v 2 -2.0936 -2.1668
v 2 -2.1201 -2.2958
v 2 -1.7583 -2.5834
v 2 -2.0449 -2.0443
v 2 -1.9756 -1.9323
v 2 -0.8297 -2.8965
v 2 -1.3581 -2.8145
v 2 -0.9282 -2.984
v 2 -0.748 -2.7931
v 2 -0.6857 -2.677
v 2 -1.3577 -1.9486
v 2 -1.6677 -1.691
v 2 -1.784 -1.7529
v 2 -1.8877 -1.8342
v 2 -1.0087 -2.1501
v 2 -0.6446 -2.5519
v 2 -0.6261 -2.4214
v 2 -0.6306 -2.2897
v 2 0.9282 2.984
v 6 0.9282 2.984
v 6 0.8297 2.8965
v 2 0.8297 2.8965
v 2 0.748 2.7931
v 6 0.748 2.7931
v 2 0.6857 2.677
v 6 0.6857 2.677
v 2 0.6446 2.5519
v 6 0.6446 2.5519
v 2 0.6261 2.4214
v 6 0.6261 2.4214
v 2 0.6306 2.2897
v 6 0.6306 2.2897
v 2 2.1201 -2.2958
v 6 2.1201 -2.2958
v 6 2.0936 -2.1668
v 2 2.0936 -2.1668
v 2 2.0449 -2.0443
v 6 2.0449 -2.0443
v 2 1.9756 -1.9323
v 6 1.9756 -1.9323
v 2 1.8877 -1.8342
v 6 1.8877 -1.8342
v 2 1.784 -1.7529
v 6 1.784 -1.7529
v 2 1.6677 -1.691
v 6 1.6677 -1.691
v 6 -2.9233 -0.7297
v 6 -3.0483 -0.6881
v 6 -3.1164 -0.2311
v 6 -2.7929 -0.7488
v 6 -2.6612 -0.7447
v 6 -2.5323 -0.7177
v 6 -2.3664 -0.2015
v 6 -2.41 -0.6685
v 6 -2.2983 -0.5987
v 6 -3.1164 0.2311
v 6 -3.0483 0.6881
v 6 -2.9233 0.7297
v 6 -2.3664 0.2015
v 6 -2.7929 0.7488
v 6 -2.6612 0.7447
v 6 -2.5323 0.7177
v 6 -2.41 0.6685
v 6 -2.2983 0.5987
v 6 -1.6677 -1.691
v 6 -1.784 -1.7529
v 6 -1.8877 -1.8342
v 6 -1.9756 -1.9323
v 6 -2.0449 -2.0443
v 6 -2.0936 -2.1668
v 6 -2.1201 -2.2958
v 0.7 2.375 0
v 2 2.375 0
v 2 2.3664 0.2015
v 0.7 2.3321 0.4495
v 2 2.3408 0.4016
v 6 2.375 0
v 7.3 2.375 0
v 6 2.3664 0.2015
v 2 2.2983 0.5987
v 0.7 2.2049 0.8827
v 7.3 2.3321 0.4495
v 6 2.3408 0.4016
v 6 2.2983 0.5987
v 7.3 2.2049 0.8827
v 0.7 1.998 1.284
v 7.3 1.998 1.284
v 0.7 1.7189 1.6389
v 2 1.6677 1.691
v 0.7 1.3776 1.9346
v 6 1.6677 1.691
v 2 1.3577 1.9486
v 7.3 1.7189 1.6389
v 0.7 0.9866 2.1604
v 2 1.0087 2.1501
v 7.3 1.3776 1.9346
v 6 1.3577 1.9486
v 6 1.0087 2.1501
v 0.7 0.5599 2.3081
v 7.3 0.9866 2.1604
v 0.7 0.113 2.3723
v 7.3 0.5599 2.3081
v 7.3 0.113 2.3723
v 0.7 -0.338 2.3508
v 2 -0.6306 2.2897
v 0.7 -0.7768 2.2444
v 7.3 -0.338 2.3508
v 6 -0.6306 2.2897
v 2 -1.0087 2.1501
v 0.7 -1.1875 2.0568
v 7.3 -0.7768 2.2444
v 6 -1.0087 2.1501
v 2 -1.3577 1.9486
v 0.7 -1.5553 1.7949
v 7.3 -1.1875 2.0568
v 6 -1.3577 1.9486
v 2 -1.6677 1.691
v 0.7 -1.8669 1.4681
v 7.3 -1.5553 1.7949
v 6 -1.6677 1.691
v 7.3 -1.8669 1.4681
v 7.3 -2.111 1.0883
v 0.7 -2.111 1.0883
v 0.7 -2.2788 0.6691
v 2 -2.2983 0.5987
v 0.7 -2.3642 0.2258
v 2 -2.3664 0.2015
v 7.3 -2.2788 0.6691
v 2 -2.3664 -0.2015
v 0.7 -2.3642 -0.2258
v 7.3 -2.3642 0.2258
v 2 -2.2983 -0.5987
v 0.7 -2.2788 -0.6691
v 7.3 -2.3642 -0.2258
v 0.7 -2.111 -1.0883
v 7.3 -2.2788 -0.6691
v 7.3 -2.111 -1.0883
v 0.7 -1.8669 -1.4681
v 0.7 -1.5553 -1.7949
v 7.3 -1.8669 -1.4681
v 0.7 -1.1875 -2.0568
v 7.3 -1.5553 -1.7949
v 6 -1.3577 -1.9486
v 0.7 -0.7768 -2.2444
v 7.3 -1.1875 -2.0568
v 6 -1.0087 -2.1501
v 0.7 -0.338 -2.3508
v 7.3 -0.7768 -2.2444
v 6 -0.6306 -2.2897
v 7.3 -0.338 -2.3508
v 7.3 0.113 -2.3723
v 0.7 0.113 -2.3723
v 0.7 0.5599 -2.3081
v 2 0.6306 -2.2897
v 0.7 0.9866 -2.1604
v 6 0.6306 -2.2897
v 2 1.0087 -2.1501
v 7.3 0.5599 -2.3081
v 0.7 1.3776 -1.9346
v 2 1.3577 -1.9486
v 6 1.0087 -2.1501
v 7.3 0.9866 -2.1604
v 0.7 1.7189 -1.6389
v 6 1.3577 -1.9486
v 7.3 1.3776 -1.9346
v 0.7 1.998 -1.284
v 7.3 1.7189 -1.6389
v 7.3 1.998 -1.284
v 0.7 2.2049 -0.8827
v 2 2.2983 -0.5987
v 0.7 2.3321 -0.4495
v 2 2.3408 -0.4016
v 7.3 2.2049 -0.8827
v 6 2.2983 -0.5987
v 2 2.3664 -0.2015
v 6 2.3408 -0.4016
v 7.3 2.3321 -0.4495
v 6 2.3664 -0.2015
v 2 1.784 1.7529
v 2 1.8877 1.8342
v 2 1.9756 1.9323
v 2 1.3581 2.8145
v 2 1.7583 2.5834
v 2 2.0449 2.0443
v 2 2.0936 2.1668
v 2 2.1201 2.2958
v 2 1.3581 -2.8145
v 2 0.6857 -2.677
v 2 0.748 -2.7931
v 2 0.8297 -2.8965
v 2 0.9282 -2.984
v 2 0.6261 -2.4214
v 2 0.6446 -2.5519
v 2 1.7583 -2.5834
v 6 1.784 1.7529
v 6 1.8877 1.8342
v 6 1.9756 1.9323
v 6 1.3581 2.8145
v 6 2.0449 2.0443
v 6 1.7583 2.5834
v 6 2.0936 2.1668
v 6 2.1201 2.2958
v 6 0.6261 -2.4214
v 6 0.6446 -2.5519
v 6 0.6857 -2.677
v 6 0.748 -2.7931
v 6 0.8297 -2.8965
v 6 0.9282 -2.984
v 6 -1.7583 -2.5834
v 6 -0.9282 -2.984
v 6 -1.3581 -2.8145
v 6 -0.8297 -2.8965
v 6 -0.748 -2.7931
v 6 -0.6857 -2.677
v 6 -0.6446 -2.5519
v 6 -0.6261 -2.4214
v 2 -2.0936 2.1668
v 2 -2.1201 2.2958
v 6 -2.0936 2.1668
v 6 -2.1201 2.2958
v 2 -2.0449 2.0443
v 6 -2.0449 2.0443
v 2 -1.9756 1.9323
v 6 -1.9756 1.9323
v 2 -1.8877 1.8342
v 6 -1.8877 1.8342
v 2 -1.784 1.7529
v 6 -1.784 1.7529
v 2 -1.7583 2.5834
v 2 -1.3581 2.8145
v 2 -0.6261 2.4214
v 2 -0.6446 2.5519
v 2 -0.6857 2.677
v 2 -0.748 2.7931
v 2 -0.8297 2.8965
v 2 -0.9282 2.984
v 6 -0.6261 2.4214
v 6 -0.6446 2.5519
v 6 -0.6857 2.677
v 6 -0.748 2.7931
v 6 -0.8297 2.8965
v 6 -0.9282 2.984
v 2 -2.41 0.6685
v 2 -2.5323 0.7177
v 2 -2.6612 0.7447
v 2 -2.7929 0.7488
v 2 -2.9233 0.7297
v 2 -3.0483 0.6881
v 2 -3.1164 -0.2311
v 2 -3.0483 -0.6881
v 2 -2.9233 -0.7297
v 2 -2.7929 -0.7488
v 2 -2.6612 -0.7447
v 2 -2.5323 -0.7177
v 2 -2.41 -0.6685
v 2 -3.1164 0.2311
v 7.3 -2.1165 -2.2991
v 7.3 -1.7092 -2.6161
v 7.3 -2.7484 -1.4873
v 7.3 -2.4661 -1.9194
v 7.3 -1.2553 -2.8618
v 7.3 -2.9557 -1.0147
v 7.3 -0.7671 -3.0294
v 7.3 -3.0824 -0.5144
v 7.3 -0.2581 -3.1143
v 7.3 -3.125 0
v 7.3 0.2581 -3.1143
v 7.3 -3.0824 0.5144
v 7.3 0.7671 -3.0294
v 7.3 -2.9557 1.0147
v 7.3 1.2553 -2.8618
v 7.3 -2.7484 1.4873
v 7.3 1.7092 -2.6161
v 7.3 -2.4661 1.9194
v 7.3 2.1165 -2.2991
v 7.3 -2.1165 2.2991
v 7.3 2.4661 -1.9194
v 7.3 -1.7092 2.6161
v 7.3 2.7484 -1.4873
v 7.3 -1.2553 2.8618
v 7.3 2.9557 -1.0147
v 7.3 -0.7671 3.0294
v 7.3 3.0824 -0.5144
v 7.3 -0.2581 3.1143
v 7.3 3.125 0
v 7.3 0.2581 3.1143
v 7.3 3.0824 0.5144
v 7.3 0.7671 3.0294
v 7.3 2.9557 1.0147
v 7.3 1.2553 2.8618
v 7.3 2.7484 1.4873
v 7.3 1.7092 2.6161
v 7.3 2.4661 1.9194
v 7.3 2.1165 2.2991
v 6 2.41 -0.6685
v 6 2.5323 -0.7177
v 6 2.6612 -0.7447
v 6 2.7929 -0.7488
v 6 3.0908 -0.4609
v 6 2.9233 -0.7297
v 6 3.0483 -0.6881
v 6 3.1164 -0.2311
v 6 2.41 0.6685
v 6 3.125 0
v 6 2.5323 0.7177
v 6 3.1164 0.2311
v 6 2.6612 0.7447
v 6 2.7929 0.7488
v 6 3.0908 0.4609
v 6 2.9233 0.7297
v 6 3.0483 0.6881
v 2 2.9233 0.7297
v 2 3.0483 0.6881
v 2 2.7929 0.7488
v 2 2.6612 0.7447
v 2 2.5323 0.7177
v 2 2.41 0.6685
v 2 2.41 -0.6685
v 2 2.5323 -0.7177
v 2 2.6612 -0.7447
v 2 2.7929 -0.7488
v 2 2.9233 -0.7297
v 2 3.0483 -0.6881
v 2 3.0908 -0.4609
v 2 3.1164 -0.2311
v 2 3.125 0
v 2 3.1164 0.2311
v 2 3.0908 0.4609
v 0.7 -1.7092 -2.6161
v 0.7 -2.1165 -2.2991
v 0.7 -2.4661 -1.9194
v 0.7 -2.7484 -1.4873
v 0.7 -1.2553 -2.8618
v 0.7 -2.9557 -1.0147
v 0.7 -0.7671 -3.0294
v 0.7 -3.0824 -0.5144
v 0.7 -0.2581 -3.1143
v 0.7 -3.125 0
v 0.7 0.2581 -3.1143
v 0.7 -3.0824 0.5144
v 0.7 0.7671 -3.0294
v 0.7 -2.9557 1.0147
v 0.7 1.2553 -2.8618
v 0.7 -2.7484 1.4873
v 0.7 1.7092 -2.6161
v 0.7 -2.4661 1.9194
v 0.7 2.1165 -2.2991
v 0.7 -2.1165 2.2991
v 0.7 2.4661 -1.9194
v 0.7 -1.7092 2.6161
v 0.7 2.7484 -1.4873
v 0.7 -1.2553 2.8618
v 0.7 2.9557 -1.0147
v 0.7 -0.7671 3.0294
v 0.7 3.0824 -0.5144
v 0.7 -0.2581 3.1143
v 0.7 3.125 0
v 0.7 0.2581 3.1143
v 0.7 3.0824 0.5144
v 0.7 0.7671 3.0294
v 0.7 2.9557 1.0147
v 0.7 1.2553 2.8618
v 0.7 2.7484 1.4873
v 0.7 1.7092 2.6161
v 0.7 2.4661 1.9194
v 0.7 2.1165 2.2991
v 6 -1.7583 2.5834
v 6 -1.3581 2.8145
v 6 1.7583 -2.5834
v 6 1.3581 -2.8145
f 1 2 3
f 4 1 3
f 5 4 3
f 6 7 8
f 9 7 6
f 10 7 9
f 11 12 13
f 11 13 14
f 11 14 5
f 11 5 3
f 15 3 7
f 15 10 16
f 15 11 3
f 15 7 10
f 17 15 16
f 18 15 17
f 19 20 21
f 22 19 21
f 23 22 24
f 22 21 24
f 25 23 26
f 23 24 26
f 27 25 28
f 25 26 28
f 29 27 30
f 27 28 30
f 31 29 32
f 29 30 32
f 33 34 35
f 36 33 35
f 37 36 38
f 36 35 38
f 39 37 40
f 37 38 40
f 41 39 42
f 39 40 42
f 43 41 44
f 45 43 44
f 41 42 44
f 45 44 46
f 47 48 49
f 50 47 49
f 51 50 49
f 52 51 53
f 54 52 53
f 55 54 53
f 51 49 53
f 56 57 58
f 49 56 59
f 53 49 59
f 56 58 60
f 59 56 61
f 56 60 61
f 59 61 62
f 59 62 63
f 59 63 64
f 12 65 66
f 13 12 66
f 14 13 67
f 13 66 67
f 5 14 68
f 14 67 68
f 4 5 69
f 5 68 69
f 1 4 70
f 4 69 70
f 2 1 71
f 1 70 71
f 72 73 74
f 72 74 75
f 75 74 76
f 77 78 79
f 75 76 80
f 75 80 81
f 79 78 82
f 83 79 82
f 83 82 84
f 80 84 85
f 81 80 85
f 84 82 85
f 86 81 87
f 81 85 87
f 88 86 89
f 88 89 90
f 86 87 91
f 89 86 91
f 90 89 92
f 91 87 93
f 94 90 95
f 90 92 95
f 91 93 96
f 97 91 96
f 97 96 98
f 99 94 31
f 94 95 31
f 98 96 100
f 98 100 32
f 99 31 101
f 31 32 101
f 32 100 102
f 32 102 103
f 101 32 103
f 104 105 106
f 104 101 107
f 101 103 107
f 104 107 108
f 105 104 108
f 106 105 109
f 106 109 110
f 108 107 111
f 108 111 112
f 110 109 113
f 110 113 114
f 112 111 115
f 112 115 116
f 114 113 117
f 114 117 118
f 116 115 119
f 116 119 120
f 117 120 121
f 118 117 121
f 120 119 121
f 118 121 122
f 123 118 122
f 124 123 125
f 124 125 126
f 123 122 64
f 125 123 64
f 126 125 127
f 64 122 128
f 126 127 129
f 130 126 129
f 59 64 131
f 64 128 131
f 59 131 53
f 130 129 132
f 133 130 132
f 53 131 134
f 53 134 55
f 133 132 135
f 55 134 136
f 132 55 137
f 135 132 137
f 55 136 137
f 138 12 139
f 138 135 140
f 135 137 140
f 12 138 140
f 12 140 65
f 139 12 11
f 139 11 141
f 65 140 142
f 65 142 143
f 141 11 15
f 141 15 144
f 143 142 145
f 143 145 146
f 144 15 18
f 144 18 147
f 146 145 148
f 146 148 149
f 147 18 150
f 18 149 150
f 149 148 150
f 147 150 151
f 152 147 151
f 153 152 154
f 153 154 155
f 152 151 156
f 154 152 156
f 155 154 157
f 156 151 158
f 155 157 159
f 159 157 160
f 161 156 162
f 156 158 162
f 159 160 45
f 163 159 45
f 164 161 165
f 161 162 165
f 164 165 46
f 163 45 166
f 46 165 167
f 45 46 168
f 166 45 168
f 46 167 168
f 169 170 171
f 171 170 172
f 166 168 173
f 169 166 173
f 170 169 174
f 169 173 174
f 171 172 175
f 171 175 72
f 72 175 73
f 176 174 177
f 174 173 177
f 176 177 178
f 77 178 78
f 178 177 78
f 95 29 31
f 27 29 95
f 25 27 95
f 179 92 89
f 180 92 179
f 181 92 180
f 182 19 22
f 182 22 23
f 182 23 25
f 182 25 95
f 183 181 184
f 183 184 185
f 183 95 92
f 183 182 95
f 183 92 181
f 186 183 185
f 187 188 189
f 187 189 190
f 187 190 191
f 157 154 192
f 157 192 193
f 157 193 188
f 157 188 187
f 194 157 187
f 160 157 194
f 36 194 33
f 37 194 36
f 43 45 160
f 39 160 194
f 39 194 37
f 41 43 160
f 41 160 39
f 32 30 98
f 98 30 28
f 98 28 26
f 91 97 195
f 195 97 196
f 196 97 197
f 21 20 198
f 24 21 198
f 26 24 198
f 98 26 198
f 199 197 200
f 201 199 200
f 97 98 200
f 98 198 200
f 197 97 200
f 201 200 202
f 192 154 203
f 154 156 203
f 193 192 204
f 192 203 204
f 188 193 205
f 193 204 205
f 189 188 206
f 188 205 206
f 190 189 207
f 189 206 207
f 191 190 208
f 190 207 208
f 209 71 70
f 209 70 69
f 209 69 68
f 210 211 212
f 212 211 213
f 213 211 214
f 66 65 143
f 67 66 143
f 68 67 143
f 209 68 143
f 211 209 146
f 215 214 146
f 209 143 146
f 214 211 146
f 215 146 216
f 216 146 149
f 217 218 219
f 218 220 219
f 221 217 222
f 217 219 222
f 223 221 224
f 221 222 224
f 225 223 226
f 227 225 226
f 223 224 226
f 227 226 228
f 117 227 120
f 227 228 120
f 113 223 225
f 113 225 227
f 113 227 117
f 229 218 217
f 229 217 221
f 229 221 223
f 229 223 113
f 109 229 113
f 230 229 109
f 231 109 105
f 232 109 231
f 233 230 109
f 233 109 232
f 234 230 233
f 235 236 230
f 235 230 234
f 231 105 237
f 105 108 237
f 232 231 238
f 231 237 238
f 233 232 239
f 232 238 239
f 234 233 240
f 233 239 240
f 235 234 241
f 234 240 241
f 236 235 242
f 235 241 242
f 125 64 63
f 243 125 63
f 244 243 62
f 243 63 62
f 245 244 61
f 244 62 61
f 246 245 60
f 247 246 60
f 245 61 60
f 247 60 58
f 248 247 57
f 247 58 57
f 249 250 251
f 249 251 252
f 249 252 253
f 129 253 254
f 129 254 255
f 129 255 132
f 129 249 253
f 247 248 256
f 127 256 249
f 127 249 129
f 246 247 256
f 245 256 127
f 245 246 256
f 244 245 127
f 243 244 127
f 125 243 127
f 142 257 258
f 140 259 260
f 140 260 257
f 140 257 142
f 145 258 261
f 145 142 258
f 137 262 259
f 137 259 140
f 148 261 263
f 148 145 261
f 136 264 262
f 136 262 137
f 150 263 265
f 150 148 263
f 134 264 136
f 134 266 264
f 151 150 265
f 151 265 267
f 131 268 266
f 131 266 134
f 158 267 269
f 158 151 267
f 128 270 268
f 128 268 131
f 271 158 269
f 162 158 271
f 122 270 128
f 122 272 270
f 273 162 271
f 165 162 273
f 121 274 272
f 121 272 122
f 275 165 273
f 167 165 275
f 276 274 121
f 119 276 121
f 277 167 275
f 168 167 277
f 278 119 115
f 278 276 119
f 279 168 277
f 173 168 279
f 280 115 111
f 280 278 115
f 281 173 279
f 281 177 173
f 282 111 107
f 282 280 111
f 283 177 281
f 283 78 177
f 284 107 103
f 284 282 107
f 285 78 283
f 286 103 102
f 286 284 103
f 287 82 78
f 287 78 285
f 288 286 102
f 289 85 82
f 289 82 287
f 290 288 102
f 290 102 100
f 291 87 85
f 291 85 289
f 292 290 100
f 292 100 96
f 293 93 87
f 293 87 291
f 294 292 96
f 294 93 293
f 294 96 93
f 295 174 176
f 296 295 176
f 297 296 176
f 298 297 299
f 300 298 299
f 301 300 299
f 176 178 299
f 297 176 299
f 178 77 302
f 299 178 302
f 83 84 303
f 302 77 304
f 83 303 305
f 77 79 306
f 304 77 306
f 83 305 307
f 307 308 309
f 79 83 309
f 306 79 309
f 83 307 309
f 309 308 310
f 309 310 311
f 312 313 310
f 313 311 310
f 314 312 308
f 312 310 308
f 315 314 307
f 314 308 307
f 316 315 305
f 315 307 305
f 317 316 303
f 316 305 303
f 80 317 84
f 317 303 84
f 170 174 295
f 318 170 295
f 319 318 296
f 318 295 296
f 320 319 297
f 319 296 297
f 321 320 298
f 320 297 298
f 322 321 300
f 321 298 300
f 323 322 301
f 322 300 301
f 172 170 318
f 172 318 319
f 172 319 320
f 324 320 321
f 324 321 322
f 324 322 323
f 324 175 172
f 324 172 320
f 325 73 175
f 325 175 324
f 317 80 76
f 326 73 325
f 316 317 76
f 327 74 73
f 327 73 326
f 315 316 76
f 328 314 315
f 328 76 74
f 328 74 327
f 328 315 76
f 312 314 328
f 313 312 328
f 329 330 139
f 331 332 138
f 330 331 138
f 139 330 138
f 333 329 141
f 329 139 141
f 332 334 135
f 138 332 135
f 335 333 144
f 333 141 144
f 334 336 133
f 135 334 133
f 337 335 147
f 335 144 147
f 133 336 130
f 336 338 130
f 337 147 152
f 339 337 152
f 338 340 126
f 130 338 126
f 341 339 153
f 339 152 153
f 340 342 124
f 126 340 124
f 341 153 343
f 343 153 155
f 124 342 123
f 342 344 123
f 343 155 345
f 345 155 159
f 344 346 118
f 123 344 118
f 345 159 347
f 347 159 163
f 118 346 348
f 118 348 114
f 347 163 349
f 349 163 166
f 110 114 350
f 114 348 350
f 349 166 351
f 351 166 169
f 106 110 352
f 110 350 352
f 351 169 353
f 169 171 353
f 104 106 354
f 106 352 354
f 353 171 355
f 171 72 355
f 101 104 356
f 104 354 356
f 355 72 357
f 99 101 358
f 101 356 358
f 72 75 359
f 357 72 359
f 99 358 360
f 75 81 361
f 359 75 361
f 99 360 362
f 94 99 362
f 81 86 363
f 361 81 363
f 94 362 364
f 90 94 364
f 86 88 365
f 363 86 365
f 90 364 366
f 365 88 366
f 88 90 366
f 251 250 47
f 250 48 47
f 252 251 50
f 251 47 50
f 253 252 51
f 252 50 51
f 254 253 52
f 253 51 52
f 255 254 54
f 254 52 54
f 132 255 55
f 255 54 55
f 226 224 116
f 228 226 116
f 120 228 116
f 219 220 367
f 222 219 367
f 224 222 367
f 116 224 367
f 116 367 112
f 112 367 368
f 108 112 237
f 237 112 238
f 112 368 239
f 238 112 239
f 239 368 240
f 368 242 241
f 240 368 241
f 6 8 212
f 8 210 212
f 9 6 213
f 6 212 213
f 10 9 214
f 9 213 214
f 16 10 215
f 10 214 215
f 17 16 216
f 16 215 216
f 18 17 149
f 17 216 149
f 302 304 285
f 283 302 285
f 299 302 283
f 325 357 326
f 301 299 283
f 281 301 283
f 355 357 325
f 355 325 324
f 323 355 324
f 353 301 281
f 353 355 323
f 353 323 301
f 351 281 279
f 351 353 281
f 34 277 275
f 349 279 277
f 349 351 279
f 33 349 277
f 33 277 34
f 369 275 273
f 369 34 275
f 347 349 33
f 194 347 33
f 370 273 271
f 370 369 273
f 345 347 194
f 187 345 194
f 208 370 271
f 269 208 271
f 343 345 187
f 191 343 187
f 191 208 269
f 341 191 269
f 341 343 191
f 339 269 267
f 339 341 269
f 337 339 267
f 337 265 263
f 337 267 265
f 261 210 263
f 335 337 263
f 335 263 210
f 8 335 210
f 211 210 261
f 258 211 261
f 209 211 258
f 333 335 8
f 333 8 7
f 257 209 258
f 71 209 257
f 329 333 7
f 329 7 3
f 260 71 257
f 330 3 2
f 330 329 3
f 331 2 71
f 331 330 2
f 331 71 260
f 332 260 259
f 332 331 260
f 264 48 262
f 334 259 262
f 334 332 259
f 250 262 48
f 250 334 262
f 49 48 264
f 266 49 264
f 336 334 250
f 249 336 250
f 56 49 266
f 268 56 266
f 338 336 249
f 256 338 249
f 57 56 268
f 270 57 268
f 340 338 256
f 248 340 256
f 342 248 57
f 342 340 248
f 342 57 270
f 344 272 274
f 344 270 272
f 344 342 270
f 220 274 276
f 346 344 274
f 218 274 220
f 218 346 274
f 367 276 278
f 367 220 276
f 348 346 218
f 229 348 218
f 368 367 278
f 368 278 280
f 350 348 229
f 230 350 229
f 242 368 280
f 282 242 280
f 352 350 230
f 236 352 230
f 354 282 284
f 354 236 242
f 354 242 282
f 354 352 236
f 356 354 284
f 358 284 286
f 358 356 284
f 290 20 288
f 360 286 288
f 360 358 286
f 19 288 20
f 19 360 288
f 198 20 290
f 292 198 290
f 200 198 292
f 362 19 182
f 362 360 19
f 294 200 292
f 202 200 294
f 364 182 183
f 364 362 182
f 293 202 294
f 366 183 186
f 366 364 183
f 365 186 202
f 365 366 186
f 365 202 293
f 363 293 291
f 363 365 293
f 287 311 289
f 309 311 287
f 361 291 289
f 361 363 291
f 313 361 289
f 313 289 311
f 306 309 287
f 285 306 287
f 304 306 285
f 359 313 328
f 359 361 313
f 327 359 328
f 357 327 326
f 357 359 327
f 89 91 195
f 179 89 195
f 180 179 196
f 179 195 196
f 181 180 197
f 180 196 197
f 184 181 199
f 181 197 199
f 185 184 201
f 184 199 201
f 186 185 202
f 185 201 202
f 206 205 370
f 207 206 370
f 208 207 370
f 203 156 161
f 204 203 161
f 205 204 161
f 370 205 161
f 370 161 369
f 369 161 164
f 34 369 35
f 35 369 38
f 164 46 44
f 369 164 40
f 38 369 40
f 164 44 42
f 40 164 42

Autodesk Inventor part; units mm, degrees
sketch "Sketch_1" plane through (0, 0, 0) normal (0, 0, 1) x (1, 0, 0)
  line L0 (7.3, 0) -> (0.7, 0)
  line L1 (0.7, 2.375) -> (7.3, 2.375)
  line L2 (7.3, 2.375) -> (7.3, 3.125)
  line L3 (7.3, 3.125) -> (0.7, 3.125)
  line L4 (0.7, 3.125) -> (0.7, 2.375)
revolve "Revolution1" add sketch "Sketch_1" angle 360 about axis through (7.3, 0, 0) along (1, 0, 0)
sketch "Sketch_2" plane through (0, 0, 0) normal (0, 0, 1) x (1, 0, 0)
  line L0 (6, 2.75) -> (2, 2.75)
  line L1 (2, 2.75) -> (2, 3.5)
  line L2 (2, 3.5) -> (6, 3.5)
  line L3 (6, 3.5) -> (6, 2.75)
  line L4 (6, 2.75) -> (2, 2.75)
revolve "Revolution2" cut sketch "Sketch_2" angle 360 about axis through (6, 2.75, 0) along (1, 0, 0)
pattern_linear "Rectangular Pattern1" count 3 spacing 2.75 along (0, -0.5, 0.866) count 3 spacing 2.75 along (0, -0.5, -0.866) of "Revolution2"
ref_plane "IP_1_XY" through (4, 0, 0) normal (1, 0, 0) x (0, 0, -1)
ref_plane "IP_1_YZ" through (4, 0, 0) normal (0, 0, -1) x (0, 1, 0)
ref_plane "IP_1_ZX" through (4, 0, 0) normal (0, 1, 0) x (1, 0, 0)
ref_plane "IP_3_1_XY" through (4, 2.75, 0) normal (1, 0, 0) x (0, 0, -1)
ref_plane "IP_3_1_YZ" through (4, 2.75, 0) normal (0, 0, -1) x (0, 1, 0)
ref_plane "IP_3_1_ZX" through (4, 2.75, 0) normal (0, 1, 0) x (1, 0, 0)
ref_plane "IP_3_2_XY" through (4, 1.375, 2.3816) normal (1, 0, 0) x (0, 0, -1)
ref_plane "IP_3_2_YZ" through (4, 1.375, 2.3816) normal (0, 0, -1) x (0, 1, 0)
ref_plane "IP_3_2_ZX" through (4, 1.375, 2.3816) normal (0, 1, 0) x (1, 0, 0)
ref_plane "IP_3_3_XY" through (4, -1.375, 2.3816) normal (1, 0, 0) x (0, 0, -1)
ref_plane "IP_3_3_YZ" through (4, -1.375, 2.3816) normal (0, 0, -1) x (0, 1, 0)
ref_plane "IP_3_3_ZX" through (4, -1.375, 2.3816) normal (0, 1, 0) x (1, 0, 0)
ref_plane "IP_3_4_XY" through (4, -2.75, 0) normal (1, 0, 0) x (0, 0, -1)
ref_plane "IP_3_4_YZ" through (4, -2.75, 0) normal (0, 0, -1) x (0, 1, 0)
ref_plane "IP_3_4_ZX" through (4, -2.75, 0) normal (0, 1, 0) x (1, 0, 0)
ref_plane "IP_3_5_XY" through (4, -1.375, -2.3816) normal (1, 0, 0) x (0, 0, -1)
ref_plane "IP_3_5_YZ" through (4, -1.375, -2.3816) normal (0, 0, -1) x (0, 1, 0)
ref_plane "IP_3_5_ZX" through (4, -1.375, -2.3816) normal (0, 1, 0) x (1, 0, 0)
ref_plane "IP_3_6_XY" through (4, 1.375, -2.3816) normal (1, 0, 0) x (0, 0, -1)
ref_plane "IP_3_6_YZ" through (4, 1.375, -2.3816) normal (0, 0, -1) x (0, 1, 0)
ref_plane "IP_3_6_ZX" through (4, 1.375, -2.3816) normal (0, 1, 0) x (1, 0, 0)
properties part number "HK0408FT2CA"
